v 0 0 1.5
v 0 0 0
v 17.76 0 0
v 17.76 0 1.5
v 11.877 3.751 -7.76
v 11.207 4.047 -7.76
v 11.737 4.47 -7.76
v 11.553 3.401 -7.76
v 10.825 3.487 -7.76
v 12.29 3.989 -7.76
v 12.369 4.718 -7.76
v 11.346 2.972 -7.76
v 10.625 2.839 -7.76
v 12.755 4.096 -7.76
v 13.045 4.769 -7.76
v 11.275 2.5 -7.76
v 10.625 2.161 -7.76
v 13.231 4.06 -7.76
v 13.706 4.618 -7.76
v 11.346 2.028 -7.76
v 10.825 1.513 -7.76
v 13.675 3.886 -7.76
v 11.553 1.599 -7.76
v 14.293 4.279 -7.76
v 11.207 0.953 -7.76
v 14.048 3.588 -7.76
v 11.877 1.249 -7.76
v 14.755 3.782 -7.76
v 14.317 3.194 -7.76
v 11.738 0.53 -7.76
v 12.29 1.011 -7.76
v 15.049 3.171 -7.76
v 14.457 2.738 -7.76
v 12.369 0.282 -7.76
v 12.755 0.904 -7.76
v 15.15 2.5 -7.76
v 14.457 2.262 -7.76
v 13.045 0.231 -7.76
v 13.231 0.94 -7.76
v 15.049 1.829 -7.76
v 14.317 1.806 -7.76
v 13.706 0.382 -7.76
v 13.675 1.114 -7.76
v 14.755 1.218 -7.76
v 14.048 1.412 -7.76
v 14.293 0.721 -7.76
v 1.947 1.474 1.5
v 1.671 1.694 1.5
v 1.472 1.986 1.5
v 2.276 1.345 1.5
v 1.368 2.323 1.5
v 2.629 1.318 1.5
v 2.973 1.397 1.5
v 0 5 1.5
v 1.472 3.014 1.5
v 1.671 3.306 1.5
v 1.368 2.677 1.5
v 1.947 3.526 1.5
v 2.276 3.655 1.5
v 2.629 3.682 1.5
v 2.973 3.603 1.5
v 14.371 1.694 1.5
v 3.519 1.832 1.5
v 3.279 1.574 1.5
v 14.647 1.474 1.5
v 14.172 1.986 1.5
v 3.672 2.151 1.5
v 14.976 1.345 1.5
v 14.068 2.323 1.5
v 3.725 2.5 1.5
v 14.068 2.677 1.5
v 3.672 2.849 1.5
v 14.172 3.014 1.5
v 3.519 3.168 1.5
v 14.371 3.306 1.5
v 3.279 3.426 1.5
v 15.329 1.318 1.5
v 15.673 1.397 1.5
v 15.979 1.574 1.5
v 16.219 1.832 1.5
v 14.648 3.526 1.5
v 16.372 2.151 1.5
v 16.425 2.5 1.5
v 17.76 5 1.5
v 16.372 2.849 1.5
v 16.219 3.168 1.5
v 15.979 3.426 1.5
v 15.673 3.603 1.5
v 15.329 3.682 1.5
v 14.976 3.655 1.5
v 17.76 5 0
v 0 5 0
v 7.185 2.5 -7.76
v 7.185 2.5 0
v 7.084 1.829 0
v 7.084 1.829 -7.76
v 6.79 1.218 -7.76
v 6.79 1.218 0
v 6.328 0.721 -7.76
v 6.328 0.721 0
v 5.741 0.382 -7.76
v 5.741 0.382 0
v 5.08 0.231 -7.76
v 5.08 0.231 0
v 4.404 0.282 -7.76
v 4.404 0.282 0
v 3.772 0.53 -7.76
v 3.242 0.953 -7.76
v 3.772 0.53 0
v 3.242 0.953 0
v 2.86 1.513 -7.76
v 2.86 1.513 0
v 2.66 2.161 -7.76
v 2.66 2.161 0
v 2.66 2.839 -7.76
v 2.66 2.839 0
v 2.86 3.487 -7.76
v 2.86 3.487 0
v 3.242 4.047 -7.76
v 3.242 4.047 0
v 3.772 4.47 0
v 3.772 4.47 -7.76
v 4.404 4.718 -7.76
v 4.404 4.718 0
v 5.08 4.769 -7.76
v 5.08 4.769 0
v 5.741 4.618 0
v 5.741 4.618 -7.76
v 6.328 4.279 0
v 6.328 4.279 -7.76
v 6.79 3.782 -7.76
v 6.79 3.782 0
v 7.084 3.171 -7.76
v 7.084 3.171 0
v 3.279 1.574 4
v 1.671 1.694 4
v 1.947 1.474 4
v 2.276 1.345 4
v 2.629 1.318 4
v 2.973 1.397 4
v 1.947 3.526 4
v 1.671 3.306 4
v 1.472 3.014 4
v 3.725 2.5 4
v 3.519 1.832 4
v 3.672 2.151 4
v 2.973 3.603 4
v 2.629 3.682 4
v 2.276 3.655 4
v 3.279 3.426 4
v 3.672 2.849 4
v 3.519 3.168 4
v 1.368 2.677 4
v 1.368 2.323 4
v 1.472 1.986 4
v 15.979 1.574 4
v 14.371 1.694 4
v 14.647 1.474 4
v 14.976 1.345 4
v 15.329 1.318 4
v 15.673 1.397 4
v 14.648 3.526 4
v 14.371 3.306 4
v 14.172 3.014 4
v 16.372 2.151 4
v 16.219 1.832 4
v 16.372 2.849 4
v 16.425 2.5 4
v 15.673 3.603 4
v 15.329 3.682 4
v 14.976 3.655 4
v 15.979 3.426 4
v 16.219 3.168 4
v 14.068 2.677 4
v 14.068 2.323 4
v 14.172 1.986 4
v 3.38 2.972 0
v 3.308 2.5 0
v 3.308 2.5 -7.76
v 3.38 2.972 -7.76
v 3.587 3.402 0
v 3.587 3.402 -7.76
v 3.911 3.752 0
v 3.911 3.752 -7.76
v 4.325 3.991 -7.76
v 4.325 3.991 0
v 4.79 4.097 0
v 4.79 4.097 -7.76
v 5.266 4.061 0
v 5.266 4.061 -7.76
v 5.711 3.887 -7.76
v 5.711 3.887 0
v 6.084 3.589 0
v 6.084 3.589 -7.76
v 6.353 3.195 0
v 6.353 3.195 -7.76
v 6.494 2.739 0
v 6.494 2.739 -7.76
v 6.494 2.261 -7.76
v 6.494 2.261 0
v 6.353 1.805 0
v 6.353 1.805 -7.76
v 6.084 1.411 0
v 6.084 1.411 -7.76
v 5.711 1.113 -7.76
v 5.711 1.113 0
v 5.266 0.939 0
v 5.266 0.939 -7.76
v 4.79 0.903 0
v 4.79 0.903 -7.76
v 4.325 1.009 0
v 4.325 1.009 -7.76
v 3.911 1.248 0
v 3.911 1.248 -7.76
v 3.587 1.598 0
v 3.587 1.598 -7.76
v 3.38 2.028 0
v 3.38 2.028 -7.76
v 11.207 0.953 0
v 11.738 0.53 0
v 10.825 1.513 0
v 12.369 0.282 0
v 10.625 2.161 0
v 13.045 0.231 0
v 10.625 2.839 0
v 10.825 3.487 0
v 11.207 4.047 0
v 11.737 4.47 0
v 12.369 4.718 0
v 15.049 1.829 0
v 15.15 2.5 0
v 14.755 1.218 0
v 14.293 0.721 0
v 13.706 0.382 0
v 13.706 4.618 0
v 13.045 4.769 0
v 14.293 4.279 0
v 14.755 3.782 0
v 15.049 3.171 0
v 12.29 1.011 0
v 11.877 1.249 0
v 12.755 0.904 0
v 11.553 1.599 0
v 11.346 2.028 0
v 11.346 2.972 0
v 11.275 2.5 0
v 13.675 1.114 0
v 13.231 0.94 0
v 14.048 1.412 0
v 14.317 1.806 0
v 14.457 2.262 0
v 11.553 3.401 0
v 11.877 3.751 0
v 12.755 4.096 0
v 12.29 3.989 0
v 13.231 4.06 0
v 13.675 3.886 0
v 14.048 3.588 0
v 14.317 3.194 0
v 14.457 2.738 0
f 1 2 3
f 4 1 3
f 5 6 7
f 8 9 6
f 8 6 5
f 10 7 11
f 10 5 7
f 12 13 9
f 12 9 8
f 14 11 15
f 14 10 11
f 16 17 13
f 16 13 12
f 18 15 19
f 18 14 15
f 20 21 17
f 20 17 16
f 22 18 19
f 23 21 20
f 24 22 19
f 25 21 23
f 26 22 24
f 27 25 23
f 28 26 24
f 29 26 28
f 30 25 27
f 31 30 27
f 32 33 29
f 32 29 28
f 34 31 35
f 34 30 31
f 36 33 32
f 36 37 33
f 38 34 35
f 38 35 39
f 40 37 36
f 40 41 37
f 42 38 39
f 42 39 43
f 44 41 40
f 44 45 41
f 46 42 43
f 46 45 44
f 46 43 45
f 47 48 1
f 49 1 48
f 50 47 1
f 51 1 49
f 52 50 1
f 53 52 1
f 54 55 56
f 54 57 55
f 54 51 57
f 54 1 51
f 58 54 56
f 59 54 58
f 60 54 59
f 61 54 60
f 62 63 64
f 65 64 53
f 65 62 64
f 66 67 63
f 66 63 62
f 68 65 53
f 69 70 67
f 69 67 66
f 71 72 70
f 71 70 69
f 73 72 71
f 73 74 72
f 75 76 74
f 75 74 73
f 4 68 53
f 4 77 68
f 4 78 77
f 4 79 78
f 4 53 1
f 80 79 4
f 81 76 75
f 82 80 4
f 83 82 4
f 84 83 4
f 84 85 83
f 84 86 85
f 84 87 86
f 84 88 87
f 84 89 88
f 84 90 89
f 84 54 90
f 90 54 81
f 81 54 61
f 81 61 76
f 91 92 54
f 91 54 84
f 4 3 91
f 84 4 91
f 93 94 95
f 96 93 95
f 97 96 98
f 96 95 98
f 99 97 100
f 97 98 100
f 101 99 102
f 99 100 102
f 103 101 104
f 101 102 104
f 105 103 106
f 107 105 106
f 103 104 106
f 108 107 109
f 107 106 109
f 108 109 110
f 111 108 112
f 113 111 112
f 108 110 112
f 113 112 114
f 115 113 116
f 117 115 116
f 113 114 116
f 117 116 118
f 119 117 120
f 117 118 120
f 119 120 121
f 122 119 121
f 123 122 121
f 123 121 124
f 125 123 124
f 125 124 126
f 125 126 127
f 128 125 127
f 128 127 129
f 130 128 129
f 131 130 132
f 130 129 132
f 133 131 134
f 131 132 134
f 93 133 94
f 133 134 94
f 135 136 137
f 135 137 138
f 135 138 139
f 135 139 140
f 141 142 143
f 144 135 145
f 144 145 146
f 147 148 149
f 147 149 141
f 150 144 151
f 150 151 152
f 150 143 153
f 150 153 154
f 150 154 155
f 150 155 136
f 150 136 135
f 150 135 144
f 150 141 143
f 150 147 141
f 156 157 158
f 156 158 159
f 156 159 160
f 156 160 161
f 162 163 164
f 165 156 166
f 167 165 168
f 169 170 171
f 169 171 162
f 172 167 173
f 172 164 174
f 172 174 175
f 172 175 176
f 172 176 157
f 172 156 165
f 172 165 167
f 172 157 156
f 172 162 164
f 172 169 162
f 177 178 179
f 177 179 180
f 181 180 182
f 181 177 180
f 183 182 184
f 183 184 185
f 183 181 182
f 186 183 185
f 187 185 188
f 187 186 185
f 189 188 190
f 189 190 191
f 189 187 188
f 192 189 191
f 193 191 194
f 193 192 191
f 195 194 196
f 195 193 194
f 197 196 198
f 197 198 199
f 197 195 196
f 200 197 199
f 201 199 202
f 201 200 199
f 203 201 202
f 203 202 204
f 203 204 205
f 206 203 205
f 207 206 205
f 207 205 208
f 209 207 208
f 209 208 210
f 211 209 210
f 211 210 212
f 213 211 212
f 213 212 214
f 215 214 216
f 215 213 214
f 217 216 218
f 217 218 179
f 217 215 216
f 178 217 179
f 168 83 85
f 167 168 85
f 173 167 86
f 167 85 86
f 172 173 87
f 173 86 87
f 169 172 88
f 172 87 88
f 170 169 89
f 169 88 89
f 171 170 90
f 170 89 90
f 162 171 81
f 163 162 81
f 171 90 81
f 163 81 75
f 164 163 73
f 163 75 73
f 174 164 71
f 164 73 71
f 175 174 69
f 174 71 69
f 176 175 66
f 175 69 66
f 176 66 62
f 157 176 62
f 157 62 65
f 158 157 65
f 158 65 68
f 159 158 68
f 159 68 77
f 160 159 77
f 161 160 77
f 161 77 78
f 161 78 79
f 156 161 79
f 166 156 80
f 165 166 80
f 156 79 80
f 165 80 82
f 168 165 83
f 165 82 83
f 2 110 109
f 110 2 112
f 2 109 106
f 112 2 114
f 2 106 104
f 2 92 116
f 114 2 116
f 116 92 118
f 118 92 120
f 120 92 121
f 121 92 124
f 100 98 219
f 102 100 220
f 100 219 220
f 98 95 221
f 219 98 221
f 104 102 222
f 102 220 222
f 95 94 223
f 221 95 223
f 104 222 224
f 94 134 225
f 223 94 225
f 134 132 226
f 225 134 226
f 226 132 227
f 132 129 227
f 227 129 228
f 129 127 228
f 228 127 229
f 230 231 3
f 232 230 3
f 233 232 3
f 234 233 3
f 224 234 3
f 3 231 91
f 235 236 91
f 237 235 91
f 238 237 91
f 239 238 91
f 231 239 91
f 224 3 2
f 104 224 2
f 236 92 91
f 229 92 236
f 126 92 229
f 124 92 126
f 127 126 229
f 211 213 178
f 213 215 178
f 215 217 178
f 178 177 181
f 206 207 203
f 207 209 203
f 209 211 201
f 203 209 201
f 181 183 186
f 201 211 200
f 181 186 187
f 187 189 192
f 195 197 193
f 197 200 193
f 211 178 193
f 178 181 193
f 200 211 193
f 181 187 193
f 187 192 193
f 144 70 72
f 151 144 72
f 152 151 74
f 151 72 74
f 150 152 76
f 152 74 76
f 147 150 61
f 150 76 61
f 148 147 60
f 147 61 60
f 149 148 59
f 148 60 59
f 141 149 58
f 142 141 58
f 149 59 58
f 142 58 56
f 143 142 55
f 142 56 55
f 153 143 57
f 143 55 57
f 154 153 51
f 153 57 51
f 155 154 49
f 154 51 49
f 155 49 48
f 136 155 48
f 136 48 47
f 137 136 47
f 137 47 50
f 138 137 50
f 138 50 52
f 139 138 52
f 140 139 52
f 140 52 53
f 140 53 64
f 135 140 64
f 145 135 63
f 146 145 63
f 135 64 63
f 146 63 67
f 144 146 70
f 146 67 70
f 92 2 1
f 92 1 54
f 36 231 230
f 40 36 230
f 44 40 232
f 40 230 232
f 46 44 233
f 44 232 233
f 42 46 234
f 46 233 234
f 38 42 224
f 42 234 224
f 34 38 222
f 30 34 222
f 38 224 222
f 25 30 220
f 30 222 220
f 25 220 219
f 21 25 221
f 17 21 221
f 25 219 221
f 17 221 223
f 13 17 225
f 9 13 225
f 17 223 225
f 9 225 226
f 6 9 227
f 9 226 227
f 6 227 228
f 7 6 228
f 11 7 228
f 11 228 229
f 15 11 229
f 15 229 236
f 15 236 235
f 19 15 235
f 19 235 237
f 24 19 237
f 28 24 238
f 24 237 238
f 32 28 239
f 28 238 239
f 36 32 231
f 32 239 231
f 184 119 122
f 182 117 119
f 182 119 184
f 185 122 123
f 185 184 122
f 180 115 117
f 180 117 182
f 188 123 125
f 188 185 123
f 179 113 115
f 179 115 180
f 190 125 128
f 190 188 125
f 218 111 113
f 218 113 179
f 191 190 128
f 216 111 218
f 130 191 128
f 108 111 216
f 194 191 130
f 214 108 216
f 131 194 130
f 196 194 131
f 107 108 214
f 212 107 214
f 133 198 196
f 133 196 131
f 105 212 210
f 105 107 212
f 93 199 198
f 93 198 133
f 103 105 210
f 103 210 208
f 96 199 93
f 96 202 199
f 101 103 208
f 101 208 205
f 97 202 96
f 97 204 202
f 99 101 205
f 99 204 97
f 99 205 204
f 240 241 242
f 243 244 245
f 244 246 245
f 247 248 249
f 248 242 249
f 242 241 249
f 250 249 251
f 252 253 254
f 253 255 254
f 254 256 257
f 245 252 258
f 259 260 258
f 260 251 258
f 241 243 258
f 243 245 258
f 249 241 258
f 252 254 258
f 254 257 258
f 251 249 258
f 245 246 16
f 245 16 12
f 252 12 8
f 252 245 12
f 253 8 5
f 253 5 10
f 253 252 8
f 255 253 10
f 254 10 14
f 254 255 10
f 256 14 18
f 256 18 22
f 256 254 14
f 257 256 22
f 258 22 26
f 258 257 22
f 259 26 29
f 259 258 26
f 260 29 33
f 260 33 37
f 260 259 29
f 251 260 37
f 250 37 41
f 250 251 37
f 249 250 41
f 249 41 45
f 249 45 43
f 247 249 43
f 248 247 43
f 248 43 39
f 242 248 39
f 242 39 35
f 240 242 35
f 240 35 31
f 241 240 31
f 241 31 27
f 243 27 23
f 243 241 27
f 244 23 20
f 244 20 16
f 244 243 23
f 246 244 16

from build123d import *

# Parameters (mm, degrees)
SKETCH1_W           = 17.76
SKETCH1_H           = 5
BOSS_EXTRUDE1_DEPTH = 1.5
SKETCH2_R           = 1.185
BOSS_EXTRUDE2_DEPTH = 2.5
SKETCH3_R           = 2.275
SKETCH3_R_2         = 1.6
SKETCH3_R_3         = 1.601514513
BOSS_EXTRUDE3_DEPTH = 7.76


with BuildPart() as part:
    # Sketch1 → Boss-Extrude1 (new body)
    with BuildSketch(Plane.XY):
        with Locations((8.88, 2.5)):
            Rectangle(SKETCH1_W, SKETCH1_H)
    extrude(amount=BOSS_EXTRUDE1_DEPTH)

    # Sketch2 → Boss-Extrude2 (add)
    with BuildSketch(Plane.XY.offset(1.5)):
        with Locations((2.54, 2.5)):
            Circle(SKETCH2_R)
        with Locations((15.24, 2.5)):
            Circle(SKETCH2_R)
    extrude(amount=BOSS_EXTRUDE2_DEPTH)

    # Sketch3 → Boss-Extrude3 (add)
    # profile 1 of 2: a face of its own
    with BuildSketch(Plane(origin=(0, 0, 0), x_dir=(-1, 0, 0), z_dir=(0, 0, -1))):
        with Locations(Location((-12.875, 2.5, 0), (0, 0, 180))):
            Circle(SKETCH3_R)
        with Locations((-12.875, 2.5)):
            Circle(SKETCH3_R_2, mode=Mode.SUBTRACT)
    # profile 2 of 2: a face of its own
    with BuildSketch(Plane(origin=(0, 0, 0), x_dir=(-1, 0, 0), z_dir=(0, 0, -1))):
        with Locations(Location((-4.91, 2.5, 0), (0, 0, 180))):
            Circle(SKETCH3_R)
        with Locations((-4.91, 2.5)):
            Circle(SKETCH3_R_3, mode=Mode.SUBTRACT)
    extrude(amount=BOSS_EXTRUDE3_DEPTH)


solid = part.part
